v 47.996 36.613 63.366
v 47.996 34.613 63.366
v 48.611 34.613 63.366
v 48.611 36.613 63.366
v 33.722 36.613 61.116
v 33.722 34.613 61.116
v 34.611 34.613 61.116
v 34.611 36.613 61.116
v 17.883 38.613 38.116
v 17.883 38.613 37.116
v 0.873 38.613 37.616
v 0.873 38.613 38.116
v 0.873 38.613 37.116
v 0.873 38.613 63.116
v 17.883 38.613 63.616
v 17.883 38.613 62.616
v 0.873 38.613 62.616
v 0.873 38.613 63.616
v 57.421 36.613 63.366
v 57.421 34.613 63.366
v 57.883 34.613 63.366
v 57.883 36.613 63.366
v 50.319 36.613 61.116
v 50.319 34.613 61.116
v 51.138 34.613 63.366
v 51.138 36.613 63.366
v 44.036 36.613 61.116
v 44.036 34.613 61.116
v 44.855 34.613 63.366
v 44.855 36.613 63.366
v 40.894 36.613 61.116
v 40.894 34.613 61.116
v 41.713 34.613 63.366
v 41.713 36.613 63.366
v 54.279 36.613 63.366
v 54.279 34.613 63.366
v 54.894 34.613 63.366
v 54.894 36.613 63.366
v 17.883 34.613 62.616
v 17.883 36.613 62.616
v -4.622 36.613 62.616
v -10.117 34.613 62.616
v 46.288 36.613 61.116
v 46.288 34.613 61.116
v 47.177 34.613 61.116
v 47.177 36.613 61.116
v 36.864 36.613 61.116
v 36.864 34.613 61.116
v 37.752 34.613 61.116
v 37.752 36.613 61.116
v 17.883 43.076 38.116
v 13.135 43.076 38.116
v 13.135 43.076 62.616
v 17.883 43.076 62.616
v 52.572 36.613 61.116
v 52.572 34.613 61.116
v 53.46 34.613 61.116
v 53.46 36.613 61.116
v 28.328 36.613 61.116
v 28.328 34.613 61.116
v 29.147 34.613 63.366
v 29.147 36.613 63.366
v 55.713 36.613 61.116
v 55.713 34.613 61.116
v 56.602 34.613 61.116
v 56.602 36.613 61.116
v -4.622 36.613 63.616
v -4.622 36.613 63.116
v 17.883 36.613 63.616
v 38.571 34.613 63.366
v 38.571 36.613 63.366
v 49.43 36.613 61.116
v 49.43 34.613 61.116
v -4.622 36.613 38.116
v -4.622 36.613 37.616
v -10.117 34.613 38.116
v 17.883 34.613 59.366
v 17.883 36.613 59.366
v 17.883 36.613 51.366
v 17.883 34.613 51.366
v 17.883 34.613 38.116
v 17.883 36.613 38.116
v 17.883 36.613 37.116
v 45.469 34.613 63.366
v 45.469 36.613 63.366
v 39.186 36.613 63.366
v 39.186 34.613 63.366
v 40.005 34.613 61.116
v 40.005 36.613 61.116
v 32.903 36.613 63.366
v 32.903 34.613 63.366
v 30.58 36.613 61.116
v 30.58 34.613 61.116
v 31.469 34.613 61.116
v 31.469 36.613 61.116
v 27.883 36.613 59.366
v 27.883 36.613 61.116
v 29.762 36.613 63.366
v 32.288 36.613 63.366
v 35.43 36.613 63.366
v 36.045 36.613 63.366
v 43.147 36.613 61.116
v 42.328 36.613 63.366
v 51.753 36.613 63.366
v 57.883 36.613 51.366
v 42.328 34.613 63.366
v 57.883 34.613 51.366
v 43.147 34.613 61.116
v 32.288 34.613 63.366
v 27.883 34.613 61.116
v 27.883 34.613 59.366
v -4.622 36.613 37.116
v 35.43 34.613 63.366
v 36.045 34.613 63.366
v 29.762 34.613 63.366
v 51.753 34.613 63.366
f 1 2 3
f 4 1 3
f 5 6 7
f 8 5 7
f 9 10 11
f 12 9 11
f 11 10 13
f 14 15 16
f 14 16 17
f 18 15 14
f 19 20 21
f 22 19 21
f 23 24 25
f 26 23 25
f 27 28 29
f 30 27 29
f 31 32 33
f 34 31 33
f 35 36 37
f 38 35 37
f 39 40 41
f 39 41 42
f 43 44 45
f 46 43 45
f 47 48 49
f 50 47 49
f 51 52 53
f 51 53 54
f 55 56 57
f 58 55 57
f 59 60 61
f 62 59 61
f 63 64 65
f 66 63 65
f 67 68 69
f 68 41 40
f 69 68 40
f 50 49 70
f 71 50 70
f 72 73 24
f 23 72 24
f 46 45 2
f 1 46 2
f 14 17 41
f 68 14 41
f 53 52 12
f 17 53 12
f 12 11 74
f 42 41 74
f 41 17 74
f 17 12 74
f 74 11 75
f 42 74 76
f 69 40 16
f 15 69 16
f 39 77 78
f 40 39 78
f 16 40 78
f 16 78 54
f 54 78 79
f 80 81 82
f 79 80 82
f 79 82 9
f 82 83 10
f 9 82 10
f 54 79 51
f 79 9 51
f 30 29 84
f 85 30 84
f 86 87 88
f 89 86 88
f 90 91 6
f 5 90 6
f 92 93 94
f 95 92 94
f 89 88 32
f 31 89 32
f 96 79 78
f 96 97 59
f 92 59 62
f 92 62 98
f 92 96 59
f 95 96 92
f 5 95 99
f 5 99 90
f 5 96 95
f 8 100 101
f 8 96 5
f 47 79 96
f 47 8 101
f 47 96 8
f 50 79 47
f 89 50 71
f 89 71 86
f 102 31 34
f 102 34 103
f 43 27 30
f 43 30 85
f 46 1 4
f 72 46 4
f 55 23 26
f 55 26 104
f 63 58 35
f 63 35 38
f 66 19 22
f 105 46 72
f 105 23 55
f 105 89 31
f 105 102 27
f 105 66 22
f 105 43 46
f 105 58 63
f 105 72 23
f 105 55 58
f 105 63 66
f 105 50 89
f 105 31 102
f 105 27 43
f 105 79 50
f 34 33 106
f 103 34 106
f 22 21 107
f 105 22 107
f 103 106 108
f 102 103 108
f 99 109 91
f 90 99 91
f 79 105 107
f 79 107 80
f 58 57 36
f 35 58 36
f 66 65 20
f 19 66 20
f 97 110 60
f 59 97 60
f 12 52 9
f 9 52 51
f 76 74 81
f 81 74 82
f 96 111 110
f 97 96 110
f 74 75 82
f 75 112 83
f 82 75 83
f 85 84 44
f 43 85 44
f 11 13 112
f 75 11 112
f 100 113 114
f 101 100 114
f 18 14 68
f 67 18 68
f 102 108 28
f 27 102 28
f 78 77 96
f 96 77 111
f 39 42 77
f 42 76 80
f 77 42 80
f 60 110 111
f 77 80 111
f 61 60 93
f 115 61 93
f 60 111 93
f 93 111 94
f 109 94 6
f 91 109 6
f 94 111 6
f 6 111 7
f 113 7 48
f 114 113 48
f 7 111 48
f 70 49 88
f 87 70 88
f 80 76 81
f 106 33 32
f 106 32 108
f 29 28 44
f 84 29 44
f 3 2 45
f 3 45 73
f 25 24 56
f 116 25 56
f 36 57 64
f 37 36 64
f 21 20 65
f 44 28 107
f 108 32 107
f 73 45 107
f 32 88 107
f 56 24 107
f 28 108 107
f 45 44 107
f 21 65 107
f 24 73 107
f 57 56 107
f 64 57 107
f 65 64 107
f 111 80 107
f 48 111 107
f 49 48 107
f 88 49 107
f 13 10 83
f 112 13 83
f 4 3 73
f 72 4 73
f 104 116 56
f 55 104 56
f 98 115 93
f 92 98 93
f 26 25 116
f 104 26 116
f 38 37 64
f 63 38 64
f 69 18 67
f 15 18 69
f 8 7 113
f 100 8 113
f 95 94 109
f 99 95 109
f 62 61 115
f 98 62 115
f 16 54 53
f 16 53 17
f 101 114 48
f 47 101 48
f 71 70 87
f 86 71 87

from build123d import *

# Parameters (mm, degrees)
COMBINE1_START     = 34.612659565
COMBINE1_DEPTH     = 2
COMBINE1_START_2   = 37.615879947
COMBINE1_2_DEPTH   = 25.5
COMBINE1_START_3   = 36.615879947
COMBINE1_3_DEPTH   = 27.5
CUT_EXTRUDE1_DEPTH = 0.5
CUT_EXTRUDE2_DEPTH = 0.5
CUT_EXTRUDE3_DEPTH = 0.5
CUT_EXTRUDE5_DEPTH = 0.5
SKETCH9_W          = 5
SKETCH9_H          = 24.5
CUT_EXTRUDE6_DEPTH = 1
SKETCH10_W         = 40
SKETCH10_H         = 2
CUT_EXTRUDE7_DEPTH = 1


with BuildPart() as part:
    # Combine1: read off the stored shape, not the designer's step
    # Combine1 outline → Combine1 (new body)
    with BuildSketch(Plane(origin=(0, 0, 0), x_dir=(1, 0, 0), z_dir=(0, 1, 0)).offset(COMBINE1_START)):
        Polygon((17.883282848, -59.365879947), (27.883282848, -59.365879947), (27.883282848, -61.115879947), (28.327718217, -61.115879947), (29.146651244, -63.365879947), (29.761507101, -63.365879947), (30.580440128, -61.115879947), (31.469310867, -61.115879947), (32.288243894, -63.365879947), (32.903099751, -63.365879947), (33.722032778, -61.115879947), (34.610903517, -61.115879947), (35.429836544, -63.365879947), (36.044692401, -63.365879947), (36.863625428, -61.115879947), (37.752496167, -61.115879947), (38.571429194, -63.365879947), (39.186285051, -63.365879947), (40.005218078, -61.115879947), (40.894088817, -61.115879947), (41.713021844, -63.365879947), (42.327877701, -63.365879947), (43.146810728, -61.115879947), (44.035681467, -61.115879947), (44.854614494, -63.365879947), (45.469470351, -63.365879947), (46.288403378, -61.115879947), (47.177274117, -61.115879947), (47.996207144, -63.365879947), (48.611063001, -63.365879947), (49.429996028, -61.115879947), (50.318866767, -61.115879947), (51.137799794, -63.365879947), (51.752655651, -63.365879947), (52.571588678, -61.115879947), (53.460459417, -61.115879947), (54.279392444, -63.365879947), (54.894248301, -63.365879947), (55.713181328, -61.115879947), (56.602052067, -61.115879947), (57.420985094, -63.365879947), (57.883282848, -63.365879947), (57.883282848, -50.365879947), (17.883282848, -50.365879947), align=None)
    extrude(amount=COMBINE1_DEPTH)

    # Combine1 2 outline → Combine1 2 (add)
    with BuildSketch(Plane.XY.offset(COMBINE1_START_2)):
        Polygon((17.883282848, 44.075659565), (15.882661668, 44.075659565), (-10.116717152, 34.612659565), (17.883282848, 34.612659565), align=None)
    extrude(amount=COMBINE1_2_DEPTH)

    # Combine1 3 outline → Combine1 3 (add)
    with BuildSketch(Plane.XY.offset(COMBINE1_START_3)):
        Polygon((17.883282848, 38.612659565), (0.873192525, 38.612659565), (-4.621762313, 36.612659565), (17.883282848, 36.612659565), align=None)
    extrude(amount=COMBINE1_3_DEPTH)

    # Sketch2 → Cut-Extrude1 (cut)
    with BuildSketch(Plane.XY.offset(63.115879947)):
        Polygon((0.873192525, 38.612659565), (15.882661668, 44.075659565), (17.883282848, 44.075659565), (17.883282848, 38.612659565), align=None)
        Polygon((17.883282848, 36.612659565), (17.883282848, 34.612659565), (-10.116717152, 34.612659565), (-4.621762313, 36.612659565), align=None)
    extrude(amount=-CUT_EXTRUDE1_DEPTH, mode=Mode.SUBTRACT)

    # Sketch3 → Cut-Extrude2 (cut)
    with BuildSketch(Plane.XY.offset(64.115879947)):
        Polygon((17.883282848, 36.612659565), (17.883282848, 38.612659565), (0.873192525, 38.612659565), (-4.621762313, 36.612659565), align=None)
    extrude(amount=-CUT_EXTRUDE2_DEPTH, mode=Mode.SUBTRACT)

    # Sketch4 → Cut-Extrude3 (cut)
    with BuildSketch(Plane(origin=(0, 0, 37.615879947), x_dir=(-1, 0, 0), z_dir=(0, 0, -1))):
        Polygon((-17.883282848, 38.612659565), (-17.883282848, 44.075659565), (-15.882661668, 44.075659565), (-0.873192525, 38.612659565), align=None)
        Polygon((-17.883282848, 36.612659565), (4.621762313, 36.612659565), (10.116717152, 34.612659565), (-17.883282848, 34.612659565), align=None)
    extrude(amount=-CUT_EXTRUDE3_DEPTH, mode=Mode.SUBTRACT)

    # Sketch7 → Cut-Extrude5 (cut)
    with BuildSketch(Plane(origin=(0, 0, 36.615879947), x_dir=(-1, 0, 0), z_dir=(0, 0, -1))):
        Polygon((-17.883282848, 38.612659565), (-17.883282848, 36.612659565), (4.621762313, 36.612659565), (-0.873192525, 38.612659565), align=None)
    extrude(amount=-CUT_EXTRUDE5_DEPTH, mode=Mode.SUBTRACT)

    # Sketch9 → Cut-Extrude6 (cut)
    with BuildSketch(Plane(origin=(0, 44.075659565, 0), x_dir=(1, 0, 0), z_dir=(0, 1, 0))):
        with Locations((15.383282848, -50.365879947)):
            Rectangle(SKETCH9_W, SKETCH9_H)
    extrude(amount=-CUT_EXTRUDE6_DEPTH, mode=Mode.SUBTRACT)

    # Sketch10 → Cut-Extrude7 (cut)
    with BuildSketch(Plane(origin=(0, 0, 50.365879947), x_dir=(-1, 0, 0), z_dir=(0, 0, -1))):
        with Locations((-37.883282848, 35.612659565)):
            Rectangle(SKETCH10_W, SKETCH10_H)
    extrude(amount=-CUT_EXTRUDE7_DEPTH, mode=Mode.SUBTRACT)


solid = part.part
